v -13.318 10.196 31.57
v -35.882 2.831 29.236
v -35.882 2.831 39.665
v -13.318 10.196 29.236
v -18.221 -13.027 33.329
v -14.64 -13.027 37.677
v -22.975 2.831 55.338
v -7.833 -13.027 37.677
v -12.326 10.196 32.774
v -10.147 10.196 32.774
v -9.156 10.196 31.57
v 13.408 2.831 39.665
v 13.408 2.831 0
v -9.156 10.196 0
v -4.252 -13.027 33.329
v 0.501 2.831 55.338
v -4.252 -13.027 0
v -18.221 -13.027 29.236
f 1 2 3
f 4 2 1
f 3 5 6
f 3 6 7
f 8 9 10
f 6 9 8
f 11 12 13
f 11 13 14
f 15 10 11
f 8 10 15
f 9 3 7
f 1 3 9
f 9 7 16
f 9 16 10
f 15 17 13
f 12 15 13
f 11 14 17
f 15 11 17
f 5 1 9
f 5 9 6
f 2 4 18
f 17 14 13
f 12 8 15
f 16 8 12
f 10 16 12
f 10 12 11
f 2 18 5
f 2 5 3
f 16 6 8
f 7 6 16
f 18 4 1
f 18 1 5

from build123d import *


with BuildPart() as f2:
    # F2: sweep along a path in F0
    with BuildLine(Plane.XZ) as f2_path:
        Line((0, 0), (0, 34.8548106849))
        Line((0, 34.8548106849), (-5.8264764957, 41.9298186898))
        Line((-5.8264764957, 41.9298186898), (-16.6470743716, 41.9298186898))
        Line((-16.6470743716, 41.9298186898), (-22.4735494703, 34.8548106849))
        Line((-22.4735494703, 34.8548106849), (-22.4735494703, 29.2364228517))
    # F1 (on Top) → F2 (sweep)
    with BuildSketch(Plane.XY):
        Polygon((-4.2523382608, -13.0273997208), (13.4082282339, 2.831066901), (-9.155889973, 10.1963328198), align=None)
    sweep(path=f2_path.line, transition=Transition.RIGHT)


solid = f2.part
